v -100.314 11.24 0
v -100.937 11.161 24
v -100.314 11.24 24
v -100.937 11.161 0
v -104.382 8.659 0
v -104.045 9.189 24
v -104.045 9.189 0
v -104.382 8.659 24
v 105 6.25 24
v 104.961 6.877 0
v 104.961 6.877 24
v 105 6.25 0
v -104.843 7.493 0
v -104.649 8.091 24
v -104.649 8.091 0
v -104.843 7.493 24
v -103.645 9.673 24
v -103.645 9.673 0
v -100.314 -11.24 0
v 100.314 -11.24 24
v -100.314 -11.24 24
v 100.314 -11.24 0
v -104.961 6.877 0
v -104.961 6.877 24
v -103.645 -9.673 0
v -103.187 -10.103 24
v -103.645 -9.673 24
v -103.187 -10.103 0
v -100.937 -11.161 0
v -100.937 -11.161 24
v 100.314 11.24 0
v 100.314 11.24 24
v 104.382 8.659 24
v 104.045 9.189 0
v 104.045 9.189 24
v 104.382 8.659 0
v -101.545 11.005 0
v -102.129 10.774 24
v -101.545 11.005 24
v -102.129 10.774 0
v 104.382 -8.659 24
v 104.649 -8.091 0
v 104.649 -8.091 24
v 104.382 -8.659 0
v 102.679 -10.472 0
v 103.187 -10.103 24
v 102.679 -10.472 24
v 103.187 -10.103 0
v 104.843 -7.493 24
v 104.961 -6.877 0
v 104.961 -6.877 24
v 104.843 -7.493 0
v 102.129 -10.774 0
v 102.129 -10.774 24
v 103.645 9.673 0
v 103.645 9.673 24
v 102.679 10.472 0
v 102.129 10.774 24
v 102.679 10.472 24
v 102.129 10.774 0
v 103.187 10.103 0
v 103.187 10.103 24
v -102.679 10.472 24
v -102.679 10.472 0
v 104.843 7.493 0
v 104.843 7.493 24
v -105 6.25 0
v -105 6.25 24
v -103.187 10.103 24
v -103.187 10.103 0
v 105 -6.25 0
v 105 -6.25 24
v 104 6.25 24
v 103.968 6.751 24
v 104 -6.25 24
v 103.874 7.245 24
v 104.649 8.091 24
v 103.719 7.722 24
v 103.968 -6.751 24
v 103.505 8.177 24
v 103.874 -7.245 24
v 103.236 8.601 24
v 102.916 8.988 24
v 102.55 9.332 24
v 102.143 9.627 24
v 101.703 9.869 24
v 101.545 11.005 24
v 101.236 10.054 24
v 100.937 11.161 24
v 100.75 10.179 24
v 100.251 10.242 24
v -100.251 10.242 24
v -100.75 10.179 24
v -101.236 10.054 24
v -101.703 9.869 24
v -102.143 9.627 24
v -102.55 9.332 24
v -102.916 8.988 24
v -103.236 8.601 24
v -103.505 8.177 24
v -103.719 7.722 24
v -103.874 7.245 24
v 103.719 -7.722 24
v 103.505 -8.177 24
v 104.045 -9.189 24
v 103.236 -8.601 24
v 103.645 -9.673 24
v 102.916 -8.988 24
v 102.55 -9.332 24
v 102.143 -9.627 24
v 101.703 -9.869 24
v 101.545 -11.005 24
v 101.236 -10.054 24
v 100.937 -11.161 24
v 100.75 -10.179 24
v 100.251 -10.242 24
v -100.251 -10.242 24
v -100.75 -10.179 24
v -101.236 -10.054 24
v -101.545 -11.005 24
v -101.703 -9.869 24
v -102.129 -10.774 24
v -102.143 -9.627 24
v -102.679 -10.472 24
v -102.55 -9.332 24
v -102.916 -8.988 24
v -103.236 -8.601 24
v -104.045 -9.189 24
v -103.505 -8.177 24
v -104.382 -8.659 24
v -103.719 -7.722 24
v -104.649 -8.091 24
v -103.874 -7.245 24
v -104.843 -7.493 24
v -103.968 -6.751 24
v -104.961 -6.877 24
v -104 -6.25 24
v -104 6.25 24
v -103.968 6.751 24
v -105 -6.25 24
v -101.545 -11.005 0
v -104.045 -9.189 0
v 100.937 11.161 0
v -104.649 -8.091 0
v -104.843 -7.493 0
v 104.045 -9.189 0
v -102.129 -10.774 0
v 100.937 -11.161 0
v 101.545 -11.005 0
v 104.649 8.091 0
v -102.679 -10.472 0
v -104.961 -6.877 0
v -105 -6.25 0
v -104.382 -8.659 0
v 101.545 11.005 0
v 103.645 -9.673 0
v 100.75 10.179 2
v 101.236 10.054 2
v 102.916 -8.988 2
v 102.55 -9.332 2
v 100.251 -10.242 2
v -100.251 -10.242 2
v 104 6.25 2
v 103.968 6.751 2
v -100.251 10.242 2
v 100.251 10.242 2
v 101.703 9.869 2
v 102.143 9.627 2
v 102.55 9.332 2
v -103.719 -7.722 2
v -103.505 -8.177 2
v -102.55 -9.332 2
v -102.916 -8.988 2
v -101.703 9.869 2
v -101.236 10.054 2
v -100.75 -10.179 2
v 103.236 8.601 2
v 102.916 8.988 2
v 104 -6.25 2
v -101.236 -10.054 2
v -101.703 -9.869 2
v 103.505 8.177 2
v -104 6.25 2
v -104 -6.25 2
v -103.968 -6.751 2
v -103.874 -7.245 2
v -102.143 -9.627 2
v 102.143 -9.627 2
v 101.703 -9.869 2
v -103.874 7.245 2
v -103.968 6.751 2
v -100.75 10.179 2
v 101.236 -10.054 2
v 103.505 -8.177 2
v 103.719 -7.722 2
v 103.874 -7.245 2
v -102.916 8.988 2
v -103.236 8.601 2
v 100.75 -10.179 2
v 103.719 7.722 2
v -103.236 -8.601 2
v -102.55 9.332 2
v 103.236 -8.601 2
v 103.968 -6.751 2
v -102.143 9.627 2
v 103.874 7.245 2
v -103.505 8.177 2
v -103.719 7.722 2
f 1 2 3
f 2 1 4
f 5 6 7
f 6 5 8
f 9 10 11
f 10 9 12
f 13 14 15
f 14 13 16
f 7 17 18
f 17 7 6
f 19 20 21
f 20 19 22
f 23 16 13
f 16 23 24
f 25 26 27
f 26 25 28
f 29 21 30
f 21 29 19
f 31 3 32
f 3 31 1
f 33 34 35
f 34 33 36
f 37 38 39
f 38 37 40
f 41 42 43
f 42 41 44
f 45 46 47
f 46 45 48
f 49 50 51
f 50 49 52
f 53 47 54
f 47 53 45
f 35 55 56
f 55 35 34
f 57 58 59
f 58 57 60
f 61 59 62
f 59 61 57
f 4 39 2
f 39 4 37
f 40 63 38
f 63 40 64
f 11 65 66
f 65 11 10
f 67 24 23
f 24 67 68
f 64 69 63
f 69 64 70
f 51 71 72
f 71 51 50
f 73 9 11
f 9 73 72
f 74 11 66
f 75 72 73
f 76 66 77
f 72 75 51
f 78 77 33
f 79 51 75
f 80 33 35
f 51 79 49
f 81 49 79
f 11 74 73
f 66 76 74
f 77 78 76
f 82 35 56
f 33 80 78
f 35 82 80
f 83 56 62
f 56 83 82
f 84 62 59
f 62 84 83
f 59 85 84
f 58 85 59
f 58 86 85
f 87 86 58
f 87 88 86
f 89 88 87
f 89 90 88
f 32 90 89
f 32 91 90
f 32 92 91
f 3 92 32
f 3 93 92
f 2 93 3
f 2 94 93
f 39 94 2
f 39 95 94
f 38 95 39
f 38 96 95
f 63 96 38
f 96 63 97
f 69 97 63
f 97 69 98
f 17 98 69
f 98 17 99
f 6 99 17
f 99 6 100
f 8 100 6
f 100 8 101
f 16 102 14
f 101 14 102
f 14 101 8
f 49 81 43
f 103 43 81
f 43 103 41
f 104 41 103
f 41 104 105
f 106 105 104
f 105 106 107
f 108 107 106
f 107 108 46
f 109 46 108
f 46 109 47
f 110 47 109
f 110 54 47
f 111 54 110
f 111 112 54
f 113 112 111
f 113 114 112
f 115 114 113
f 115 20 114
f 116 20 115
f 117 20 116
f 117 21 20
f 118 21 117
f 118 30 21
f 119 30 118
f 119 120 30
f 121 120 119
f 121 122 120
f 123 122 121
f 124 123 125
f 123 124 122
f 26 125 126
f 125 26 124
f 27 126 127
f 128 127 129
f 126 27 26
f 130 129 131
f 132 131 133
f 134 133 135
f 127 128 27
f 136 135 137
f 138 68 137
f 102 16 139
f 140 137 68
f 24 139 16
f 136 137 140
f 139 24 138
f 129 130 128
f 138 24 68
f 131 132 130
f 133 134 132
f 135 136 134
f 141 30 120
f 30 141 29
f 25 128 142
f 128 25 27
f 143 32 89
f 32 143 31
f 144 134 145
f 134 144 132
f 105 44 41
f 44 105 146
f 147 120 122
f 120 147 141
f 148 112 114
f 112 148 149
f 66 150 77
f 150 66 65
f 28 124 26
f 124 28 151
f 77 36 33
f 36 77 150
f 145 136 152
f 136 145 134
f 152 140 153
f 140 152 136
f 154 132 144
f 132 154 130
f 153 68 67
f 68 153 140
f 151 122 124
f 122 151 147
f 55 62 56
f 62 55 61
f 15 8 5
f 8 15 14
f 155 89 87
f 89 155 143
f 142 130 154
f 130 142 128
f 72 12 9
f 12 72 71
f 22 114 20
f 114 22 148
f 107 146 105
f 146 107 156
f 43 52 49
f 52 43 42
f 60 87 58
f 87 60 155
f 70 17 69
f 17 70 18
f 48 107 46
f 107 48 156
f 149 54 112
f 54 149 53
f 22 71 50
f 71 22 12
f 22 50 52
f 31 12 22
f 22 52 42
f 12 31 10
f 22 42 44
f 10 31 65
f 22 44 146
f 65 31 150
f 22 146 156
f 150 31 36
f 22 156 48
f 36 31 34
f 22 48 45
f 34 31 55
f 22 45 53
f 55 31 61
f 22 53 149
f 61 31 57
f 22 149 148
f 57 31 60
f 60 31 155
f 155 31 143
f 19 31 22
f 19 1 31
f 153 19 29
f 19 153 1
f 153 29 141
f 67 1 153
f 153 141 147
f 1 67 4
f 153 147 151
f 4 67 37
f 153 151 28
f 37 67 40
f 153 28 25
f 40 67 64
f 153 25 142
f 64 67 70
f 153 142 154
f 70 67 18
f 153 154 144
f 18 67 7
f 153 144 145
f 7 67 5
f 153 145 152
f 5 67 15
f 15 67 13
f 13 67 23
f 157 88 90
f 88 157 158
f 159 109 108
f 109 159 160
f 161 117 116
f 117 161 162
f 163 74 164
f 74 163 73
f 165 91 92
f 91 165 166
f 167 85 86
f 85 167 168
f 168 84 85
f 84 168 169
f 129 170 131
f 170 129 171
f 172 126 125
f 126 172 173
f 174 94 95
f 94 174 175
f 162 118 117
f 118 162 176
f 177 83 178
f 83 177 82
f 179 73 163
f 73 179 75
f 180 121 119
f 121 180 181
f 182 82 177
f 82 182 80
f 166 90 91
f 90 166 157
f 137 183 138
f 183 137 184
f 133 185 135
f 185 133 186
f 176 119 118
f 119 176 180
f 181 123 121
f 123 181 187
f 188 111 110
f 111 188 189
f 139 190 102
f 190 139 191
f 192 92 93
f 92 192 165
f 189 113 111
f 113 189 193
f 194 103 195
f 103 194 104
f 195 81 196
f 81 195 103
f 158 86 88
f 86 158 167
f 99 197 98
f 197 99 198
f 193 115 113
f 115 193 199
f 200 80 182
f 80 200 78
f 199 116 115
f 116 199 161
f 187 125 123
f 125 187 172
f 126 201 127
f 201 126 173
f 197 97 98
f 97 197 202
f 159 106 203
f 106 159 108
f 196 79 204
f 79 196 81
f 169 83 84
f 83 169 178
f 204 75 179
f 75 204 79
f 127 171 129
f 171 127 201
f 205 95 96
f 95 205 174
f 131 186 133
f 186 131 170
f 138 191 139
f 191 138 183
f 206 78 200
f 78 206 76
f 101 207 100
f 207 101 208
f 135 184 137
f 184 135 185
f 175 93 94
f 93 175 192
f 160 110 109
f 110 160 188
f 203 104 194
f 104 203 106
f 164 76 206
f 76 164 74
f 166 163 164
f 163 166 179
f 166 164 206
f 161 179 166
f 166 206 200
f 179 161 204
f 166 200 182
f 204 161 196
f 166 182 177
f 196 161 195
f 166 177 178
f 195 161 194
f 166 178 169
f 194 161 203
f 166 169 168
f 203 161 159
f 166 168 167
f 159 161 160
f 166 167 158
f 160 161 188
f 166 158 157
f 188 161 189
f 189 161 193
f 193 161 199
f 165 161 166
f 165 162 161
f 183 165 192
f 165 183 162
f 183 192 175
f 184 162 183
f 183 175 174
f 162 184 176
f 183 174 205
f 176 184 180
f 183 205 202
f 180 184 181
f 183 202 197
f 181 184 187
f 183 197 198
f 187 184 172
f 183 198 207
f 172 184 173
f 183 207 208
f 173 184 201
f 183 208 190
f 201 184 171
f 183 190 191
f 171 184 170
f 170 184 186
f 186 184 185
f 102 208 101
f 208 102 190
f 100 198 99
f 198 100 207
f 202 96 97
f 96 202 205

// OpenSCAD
$fn = 50;


difference() {
	union() {
		hull() {
			translate(v = [-100.0000000000, 6.2500000000, 0]) {
				cylinder(h = 24, r = 5);
			}
			translate(v = [100.0000000000, 6.2500000000, 0]) {
				cylinder(h = 24, r = 5);
			}
			translate(v = [-100.0000000000, -6.2500000000, 0]) {
				cylinder(h = 24, r = 5);
			}
			translate(v = [100.0000000000, -6.2500000000, 0]) {
				cylinder(h = 24, r = 5);
			}
		}
	}
	union() {
		translate(v = [0, 0, 2]) {
			hull() {
				translate(v = [-100.0000000000, 6.2500000000, 0]) {
					cylinder(h = 22, r = 4);
				}
				translate(v = [100.0000000000, 6.2500000000, 0]) {
					cylinder(h = 22, r = 4);
				}
				translate(v = [-100.0000000000, -6.2500000000, 0]) {
					cylinder(h = 22, r = 4);
				}
				translate(v = [100.0000000000, -6.2500000000, 0]) {
					cylinder(h = 22, r = 4);
				}
			}
		}
	}
}
